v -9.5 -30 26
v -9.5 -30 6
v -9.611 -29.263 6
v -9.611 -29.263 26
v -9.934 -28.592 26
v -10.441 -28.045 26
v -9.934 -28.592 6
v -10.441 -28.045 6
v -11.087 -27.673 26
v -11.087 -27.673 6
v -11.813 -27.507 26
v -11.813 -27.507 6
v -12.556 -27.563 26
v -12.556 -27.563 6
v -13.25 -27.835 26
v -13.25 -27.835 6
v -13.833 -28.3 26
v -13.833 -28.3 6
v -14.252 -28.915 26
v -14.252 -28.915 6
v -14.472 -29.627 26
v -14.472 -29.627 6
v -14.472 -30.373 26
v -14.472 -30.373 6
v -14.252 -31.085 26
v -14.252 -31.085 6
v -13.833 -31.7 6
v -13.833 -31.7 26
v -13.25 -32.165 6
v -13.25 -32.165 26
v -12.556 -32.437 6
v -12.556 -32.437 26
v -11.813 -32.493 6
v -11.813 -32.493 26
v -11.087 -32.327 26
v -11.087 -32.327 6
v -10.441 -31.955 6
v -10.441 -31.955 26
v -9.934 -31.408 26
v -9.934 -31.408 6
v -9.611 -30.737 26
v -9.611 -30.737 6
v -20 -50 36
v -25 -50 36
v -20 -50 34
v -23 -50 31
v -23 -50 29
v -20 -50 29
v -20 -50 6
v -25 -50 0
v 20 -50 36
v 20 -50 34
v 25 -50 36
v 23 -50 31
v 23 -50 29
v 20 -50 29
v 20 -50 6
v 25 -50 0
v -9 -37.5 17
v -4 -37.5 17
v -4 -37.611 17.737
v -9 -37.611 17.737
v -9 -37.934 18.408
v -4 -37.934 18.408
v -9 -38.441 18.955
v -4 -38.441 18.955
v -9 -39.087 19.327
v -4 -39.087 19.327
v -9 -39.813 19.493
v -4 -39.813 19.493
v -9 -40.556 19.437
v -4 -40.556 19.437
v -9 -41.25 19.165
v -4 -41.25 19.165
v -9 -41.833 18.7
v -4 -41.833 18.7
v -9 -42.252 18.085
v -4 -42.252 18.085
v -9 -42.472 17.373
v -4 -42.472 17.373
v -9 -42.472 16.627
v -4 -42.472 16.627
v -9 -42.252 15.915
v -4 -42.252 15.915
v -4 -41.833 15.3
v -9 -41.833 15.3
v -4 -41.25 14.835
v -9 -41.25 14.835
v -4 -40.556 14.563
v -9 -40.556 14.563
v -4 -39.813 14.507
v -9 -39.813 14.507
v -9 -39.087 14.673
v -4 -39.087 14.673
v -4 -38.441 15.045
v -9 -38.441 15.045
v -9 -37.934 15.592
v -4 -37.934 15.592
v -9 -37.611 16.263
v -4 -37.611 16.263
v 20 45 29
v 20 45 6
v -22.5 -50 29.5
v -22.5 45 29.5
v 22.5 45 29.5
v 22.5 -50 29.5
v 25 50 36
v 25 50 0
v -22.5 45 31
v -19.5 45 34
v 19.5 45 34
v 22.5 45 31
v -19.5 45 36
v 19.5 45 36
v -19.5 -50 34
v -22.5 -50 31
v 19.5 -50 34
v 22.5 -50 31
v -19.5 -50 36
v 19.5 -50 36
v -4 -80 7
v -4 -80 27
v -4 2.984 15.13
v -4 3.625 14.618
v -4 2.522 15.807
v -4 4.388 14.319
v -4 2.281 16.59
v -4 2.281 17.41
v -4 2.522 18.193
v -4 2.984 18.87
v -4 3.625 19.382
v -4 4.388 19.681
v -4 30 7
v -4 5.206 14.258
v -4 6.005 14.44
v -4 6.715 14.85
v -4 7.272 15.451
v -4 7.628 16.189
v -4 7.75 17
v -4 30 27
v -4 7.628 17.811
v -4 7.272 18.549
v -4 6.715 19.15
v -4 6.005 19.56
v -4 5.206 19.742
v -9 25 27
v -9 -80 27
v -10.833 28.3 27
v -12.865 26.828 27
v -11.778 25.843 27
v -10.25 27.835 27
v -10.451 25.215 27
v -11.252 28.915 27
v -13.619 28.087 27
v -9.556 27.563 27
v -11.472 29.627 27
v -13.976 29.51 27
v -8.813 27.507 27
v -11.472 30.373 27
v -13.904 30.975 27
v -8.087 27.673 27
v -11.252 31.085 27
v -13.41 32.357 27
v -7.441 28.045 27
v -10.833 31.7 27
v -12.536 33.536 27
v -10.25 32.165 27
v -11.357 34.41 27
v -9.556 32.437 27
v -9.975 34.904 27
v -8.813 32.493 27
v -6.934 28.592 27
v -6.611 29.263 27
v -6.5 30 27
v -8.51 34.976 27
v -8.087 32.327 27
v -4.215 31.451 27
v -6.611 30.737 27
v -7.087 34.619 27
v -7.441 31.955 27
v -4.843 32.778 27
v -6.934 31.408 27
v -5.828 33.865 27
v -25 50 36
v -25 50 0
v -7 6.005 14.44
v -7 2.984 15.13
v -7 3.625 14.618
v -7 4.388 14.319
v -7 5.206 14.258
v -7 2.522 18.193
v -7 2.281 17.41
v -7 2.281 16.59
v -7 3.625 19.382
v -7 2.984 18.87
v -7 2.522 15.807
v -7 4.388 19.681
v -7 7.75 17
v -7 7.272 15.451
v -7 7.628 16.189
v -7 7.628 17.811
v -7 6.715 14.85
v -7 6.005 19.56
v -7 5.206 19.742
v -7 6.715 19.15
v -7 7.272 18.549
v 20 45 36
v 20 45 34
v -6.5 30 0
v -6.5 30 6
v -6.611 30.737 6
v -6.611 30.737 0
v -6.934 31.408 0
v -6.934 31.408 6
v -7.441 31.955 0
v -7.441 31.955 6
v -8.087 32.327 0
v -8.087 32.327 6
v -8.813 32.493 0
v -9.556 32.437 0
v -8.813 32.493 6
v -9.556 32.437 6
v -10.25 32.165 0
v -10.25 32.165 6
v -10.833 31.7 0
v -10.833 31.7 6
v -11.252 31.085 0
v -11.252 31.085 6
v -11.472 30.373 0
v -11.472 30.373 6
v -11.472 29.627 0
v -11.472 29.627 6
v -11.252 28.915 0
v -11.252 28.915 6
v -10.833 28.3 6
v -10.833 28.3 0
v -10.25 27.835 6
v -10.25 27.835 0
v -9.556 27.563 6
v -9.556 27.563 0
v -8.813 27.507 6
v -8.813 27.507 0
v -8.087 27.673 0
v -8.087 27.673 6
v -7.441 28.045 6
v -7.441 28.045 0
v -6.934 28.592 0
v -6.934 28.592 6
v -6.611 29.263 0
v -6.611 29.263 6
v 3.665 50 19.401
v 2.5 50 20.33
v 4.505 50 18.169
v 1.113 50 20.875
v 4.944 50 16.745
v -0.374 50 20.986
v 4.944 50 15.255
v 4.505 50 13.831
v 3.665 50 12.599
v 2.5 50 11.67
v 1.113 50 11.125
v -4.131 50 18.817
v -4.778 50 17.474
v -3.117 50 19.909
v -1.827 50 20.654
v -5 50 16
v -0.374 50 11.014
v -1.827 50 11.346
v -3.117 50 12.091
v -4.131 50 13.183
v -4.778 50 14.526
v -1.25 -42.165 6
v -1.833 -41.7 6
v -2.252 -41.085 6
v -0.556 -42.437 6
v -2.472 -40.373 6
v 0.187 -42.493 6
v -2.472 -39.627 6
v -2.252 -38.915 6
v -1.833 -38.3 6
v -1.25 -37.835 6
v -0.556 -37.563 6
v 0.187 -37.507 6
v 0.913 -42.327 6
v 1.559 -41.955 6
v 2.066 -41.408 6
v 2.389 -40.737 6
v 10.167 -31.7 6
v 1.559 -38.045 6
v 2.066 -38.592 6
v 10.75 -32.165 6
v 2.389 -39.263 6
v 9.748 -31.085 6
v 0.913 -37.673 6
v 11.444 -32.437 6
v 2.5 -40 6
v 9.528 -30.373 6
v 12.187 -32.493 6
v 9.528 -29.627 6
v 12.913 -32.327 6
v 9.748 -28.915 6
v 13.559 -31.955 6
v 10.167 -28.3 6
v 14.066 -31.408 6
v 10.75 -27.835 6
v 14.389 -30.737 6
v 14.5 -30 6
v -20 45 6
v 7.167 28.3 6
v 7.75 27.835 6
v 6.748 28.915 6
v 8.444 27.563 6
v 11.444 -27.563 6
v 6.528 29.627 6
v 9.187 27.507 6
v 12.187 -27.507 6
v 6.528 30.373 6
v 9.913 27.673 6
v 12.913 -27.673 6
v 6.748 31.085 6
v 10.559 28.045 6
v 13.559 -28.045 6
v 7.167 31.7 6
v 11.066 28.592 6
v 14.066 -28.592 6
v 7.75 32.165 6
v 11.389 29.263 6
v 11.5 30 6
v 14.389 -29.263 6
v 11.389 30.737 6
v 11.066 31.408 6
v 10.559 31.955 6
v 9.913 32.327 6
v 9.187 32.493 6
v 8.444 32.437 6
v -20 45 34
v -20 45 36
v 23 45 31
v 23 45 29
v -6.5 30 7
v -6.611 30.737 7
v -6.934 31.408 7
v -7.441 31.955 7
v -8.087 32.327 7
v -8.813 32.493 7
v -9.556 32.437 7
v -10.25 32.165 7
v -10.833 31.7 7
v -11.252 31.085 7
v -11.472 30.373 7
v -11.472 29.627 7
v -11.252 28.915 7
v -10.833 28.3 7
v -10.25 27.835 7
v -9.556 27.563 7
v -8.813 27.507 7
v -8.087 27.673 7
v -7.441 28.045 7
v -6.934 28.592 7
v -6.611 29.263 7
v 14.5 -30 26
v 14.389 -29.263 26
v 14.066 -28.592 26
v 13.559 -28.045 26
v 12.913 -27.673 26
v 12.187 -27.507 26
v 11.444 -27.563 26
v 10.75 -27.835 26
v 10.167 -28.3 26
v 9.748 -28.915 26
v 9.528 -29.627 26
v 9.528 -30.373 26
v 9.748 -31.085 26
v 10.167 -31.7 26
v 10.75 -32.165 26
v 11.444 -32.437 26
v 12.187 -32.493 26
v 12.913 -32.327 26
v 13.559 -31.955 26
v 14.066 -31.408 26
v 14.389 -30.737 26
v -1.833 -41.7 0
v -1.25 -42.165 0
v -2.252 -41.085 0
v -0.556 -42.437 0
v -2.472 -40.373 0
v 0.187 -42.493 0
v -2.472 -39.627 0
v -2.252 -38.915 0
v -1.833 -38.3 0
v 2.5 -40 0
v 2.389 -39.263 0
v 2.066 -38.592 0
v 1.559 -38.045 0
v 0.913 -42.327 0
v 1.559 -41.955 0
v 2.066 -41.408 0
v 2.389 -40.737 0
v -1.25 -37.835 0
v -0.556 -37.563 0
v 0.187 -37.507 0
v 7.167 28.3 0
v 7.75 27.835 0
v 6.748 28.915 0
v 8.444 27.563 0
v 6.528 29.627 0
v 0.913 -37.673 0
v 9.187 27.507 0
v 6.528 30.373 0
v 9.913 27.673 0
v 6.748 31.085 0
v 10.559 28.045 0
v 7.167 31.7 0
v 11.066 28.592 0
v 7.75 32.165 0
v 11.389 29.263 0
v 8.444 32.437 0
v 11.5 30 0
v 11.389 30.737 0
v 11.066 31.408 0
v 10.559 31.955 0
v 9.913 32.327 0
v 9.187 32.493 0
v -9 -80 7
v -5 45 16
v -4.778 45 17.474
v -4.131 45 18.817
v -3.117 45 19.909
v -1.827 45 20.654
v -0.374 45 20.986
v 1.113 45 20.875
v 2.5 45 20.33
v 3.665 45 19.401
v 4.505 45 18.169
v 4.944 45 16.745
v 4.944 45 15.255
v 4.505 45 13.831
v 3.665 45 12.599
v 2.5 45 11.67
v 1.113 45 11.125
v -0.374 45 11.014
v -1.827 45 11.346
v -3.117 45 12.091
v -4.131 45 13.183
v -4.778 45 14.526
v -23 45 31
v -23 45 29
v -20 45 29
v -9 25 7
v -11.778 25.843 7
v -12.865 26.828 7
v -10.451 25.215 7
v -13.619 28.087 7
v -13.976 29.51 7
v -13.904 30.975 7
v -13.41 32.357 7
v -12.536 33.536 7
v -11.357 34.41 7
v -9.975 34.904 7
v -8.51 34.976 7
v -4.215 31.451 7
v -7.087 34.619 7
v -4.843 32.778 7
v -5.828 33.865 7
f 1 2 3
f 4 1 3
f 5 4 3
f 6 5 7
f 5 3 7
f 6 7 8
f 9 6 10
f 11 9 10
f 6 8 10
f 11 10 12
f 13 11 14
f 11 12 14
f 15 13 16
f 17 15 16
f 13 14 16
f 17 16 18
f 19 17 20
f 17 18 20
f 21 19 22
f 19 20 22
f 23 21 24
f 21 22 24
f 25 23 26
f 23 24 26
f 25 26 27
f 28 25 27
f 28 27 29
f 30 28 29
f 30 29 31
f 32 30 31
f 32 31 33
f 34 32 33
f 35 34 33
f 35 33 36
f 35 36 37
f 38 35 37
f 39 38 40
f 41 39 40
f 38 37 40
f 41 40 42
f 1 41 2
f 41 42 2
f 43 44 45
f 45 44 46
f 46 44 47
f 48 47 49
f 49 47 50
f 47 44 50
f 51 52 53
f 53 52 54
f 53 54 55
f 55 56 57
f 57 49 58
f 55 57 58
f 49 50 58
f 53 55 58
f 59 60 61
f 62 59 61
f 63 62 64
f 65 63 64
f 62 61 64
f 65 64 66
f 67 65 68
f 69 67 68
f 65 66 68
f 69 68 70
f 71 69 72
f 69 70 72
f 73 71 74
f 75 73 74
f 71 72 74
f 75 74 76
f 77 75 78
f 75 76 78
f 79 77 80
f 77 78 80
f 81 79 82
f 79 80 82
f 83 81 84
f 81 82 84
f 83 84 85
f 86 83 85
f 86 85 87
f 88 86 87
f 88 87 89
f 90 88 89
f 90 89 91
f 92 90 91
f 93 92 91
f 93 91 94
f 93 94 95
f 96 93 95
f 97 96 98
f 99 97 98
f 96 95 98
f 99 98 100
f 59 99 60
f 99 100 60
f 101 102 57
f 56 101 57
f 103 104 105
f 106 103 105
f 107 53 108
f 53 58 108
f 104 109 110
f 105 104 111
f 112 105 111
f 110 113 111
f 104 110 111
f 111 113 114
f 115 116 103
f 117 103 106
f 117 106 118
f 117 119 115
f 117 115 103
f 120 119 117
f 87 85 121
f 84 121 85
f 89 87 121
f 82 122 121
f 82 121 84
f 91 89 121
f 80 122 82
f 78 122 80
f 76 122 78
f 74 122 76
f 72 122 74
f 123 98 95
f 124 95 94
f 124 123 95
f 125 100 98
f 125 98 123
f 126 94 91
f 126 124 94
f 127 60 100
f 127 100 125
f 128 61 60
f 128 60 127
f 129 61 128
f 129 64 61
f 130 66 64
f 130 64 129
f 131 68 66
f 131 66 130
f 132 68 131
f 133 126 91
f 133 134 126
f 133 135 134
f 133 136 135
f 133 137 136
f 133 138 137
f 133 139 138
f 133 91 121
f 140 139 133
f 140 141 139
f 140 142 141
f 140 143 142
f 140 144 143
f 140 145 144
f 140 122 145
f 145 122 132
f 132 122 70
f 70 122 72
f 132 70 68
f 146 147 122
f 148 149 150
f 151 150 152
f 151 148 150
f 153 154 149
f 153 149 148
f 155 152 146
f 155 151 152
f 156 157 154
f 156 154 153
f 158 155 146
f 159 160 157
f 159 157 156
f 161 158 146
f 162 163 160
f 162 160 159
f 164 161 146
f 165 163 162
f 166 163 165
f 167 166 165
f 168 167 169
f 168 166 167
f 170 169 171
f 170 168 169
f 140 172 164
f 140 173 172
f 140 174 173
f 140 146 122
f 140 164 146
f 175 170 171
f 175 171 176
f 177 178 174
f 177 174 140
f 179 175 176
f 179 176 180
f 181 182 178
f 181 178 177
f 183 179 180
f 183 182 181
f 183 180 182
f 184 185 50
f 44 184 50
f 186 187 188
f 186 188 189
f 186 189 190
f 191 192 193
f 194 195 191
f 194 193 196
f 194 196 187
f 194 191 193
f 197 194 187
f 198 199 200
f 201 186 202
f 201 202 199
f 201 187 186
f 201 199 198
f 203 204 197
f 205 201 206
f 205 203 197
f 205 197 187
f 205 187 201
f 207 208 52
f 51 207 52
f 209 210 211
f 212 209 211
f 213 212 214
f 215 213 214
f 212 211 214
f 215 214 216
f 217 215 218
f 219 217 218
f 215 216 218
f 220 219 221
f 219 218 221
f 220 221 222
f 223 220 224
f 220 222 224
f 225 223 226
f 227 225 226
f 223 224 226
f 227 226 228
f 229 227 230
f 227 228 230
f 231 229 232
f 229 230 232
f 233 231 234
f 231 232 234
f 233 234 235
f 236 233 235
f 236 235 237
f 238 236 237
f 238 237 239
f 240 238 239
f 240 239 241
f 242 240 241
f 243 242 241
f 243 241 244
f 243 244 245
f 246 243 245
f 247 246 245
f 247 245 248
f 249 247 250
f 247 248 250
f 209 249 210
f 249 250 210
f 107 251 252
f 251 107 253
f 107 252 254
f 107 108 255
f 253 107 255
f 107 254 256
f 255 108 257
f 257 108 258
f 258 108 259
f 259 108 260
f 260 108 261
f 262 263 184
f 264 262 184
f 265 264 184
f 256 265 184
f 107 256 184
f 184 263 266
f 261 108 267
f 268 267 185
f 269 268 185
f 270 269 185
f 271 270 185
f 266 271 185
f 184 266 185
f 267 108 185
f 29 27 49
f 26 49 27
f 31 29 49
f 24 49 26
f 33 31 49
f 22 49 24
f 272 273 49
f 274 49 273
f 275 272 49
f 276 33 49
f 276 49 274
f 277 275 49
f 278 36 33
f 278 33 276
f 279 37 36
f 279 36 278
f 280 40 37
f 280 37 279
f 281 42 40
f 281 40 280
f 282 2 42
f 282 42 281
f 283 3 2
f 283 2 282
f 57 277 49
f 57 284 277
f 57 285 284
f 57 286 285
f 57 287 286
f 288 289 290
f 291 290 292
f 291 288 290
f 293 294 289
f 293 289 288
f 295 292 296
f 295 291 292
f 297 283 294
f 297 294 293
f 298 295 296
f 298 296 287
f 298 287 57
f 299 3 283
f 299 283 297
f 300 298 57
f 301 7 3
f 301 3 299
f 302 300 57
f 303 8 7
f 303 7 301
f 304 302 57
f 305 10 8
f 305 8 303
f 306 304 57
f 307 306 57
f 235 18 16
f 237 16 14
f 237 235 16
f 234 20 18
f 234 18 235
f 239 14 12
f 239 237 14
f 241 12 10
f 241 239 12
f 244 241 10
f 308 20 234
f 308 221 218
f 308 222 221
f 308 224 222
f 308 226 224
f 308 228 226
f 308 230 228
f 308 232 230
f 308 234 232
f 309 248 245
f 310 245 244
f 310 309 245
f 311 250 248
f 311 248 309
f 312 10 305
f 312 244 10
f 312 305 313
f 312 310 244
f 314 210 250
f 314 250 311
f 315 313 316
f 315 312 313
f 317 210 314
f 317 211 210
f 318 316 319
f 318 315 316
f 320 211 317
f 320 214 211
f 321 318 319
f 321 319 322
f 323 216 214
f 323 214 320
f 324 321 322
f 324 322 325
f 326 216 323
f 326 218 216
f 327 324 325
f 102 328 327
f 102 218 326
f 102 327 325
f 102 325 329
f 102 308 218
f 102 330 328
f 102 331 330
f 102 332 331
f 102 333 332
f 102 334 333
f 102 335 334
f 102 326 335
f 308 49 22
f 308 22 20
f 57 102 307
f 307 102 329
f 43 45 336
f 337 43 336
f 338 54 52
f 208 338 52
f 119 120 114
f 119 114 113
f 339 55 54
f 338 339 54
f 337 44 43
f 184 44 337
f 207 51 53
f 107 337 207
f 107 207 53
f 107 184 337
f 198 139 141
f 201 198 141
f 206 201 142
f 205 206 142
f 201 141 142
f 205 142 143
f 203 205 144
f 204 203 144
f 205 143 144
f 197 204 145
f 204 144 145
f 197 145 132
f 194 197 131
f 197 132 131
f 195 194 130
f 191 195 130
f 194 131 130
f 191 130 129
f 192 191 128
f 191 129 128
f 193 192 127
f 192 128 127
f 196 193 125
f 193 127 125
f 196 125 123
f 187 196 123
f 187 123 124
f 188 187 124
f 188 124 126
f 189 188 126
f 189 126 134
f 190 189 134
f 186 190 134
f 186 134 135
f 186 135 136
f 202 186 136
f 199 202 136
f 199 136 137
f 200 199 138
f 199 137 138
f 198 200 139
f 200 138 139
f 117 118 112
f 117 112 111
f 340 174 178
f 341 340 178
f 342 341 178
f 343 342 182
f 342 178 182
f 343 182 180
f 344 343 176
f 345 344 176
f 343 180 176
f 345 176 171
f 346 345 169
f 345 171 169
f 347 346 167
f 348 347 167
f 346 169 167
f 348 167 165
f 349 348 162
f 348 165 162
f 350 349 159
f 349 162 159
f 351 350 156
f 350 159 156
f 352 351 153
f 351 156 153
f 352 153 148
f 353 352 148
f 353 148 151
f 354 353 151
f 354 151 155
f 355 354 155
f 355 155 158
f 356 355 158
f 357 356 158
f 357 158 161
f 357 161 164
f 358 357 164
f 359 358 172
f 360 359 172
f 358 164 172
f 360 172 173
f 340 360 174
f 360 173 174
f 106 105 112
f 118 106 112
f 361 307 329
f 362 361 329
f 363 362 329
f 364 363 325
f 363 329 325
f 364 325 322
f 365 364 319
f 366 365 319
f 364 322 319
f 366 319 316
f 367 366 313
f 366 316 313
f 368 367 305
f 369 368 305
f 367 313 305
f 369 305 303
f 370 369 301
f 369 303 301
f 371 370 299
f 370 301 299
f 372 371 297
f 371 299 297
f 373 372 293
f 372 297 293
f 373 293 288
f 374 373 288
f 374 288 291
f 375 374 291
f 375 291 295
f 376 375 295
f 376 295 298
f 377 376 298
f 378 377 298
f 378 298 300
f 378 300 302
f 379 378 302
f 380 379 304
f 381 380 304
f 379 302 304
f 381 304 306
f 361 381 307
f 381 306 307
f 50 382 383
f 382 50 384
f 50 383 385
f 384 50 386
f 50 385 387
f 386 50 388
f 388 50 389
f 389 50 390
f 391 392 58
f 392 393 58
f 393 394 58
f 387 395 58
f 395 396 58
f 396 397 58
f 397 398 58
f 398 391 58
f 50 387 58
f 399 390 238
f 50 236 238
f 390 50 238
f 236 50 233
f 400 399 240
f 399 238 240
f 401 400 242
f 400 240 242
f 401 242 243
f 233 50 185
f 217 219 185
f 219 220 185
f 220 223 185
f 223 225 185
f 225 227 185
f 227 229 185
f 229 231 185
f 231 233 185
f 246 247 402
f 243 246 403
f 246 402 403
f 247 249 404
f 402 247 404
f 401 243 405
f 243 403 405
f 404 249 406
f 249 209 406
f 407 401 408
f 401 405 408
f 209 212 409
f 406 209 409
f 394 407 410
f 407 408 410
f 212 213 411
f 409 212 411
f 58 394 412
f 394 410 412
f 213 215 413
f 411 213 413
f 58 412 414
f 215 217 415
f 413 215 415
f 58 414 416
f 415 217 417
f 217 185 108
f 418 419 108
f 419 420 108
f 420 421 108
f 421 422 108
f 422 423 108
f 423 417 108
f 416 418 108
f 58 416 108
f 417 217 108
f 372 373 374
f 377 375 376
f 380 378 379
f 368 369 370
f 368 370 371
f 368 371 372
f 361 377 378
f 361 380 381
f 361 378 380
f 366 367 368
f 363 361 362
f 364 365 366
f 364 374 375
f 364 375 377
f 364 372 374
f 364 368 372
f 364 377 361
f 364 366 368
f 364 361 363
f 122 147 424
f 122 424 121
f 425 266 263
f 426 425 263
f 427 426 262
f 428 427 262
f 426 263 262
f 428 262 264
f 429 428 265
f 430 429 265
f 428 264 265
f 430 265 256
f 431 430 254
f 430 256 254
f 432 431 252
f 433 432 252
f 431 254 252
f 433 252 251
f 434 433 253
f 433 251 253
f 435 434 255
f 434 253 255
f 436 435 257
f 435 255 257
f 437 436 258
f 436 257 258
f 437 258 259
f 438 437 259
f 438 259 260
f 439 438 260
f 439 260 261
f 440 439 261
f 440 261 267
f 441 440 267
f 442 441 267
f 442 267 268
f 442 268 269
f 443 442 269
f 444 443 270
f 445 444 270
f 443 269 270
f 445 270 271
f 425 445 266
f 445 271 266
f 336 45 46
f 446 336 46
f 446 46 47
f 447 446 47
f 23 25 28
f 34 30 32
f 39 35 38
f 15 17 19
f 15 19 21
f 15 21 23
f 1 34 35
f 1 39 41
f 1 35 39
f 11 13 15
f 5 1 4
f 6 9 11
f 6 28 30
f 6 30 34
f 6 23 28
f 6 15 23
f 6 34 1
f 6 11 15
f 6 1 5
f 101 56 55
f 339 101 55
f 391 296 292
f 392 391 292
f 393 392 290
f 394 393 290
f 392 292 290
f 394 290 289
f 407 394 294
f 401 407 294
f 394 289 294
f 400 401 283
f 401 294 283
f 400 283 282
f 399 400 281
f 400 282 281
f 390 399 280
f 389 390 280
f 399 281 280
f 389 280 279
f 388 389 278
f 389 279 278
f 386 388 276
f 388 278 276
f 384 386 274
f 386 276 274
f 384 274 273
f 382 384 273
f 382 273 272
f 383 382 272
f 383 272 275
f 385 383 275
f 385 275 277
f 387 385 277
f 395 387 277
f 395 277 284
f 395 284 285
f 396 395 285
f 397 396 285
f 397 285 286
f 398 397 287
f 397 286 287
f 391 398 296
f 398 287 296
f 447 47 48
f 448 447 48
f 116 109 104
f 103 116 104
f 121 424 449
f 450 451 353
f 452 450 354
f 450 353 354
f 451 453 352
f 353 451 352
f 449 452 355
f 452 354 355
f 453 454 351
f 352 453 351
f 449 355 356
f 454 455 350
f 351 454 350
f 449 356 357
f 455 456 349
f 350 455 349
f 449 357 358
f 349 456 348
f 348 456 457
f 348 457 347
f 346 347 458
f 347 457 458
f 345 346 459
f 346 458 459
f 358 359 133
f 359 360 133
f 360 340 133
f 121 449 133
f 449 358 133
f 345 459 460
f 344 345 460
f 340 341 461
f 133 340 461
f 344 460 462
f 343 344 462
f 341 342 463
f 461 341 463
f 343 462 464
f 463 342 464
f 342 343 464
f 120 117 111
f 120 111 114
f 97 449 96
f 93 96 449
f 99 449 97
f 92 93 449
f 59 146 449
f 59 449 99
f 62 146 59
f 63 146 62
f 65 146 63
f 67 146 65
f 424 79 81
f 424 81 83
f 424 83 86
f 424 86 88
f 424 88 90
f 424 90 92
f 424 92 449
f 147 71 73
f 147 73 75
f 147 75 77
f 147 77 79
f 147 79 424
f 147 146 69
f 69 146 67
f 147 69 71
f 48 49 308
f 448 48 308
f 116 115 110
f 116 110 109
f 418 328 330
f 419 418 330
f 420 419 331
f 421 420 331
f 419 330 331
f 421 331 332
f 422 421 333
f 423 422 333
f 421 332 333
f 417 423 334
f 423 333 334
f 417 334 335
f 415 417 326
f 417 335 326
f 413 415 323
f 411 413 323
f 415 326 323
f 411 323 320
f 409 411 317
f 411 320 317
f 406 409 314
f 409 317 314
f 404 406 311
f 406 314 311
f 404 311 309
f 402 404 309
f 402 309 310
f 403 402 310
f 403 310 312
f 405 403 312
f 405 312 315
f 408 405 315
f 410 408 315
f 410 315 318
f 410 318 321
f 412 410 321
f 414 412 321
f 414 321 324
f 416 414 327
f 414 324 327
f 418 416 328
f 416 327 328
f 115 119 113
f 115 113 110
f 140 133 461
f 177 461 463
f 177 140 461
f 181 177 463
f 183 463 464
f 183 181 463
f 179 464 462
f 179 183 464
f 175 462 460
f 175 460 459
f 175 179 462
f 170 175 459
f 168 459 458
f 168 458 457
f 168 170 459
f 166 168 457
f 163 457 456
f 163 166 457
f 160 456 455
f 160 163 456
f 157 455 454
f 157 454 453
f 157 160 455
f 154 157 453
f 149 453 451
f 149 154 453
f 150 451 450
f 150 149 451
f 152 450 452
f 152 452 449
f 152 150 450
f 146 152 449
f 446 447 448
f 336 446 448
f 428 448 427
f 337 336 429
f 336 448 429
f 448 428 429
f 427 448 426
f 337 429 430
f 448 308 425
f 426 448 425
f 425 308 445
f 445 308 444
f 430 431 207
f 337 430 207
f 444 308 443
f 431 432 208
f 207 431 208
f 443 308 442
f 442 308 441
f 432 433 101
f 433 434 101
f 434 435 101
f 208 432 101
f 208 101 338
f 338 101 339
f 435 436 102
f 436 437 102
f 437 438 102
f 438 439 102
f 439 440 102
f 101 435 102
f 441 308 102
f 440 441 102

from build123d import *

# Parameters (mm, degrees)
F0_W      = 50
F0_H      = 100
F1_DEPTH  = 6
F3_DEPTH  = 30
F5_DEPTH  = 95
F8_R      = 2.5
F9_DEPTH  = 6
F10_R     = 5
F11_DEPTH = 5
F12_DEPTH = 95
F14_R     = 2.5
F15_DEPTH = 20
F16_R     = 2.5
F17_DEPTH = 5
F16_R_2   = 2.75
F18_DEPTH = 3
F19_DEPTH = 20


# Not quite as in the source:
# - a feature names something its author has since deleted; it is built from what else it names


with BuildPart() as f1:
    # F0 (on Top) → F1 (new body)
    with BuildSketch(Plane.XY):
        Rectangle(F0_W, F0_H)
    extrude(amount=F1_DEPTH)

    # F2 (on face) → F3 (join)
    with BuildSketch(Plane.XY.offset(6)):
        Polygon((-20, 50), (-25, 50), (-25, 45), (-25, -50), (-20, -50), (-20, 45), (20, 45), (20, -50), (25, -50), (25, 45), (25, 50), (20, 50), align=None)
    extrude(amount=F3_DEPTH)

    # F4 (on face) → F5 (cut)
    with BuildSketch(Plane.XZ.offset(50)):
        Polygon((-23, 29), (-20, 29), (-20, 34), (-23, 31), align=None)
        Polygon((20, 34), (20, 29), (23, 29), (23, 31), align=None)
    extrude(amount=-F5_DEPTH, mode=Mode.SUBTRACT)

    # F8 (on face) → F9 (cut, through all)
    with BuildSketch(Plane.XY.offset(6)):
        with Locations((0, -40)):
            Circle(F8_R)
        with Locations((-9, 30)):
            Circle(F8_R)
        with Locations((9, 30)):
            Circle(F8_R)
    extrude(amount=-F9_DEPTH, mode=Mode.SUBTRACT)

    # F10 (on face) → F11 (cut, through all)
    with BuildSketch(Plane(origin=(0, 50, 0), x_dir=(-1, 0, 0), z_dir=(0, 1, 0))):
        with Locations((0, 16)):
            Circle(F10_R)
    extrude(amount=-F11_DEPTH, mode=Mode.SUBTRACT)

    # F8 (on face) → F19 (join)
    with BuildSketch(Plane.XY.offset(6)):
        with Locations((-12, -30)):
            Circle(F8_R)
        with Locations((12, -30)):
            Circle(F8_R)
    extrude(amount=F19_DEPTH)


with BuildPart() as f12:
    # F7 (on offset) → F12 (new body)
    with BuildSketch(Plane.XZ.offset(50)):
        Polygon((-22.5, 31), (-22.5, 29.5), (22.5, 29.5), (22.5, 31), (19.5, 34), (19.5, 36), (-19.5, 36), (-19.5, 34), align=None)
    extrude(amount=-F12_DEPTH)


with BuildPart() as f15:
    # F14 (on offset) → F15 (new body)
    with BuildSketch(Plane.XY.offset(27)):
        with BuildLine():
            Line((-4, -80), (-4, 30))
            ThreePointArc((-4, 30), (-12.5355339059, 33.5355339059), (-9, 25))
            Line((-9, 25), (-9, -80))
            Line((-9, -80), (-4, -80))
        make_face()
        with Locations((-9, 30)):
            Circle(F14_R, mode=Mode.SUBTRACT)
    extrude(amount=-F15_DEPTH)

    # F16 (on face) → F17 (cut, through all)
    with BuildSketch(Plane.YZ.offset(-4)):
        with Locations((-40, 17)):
            Circle(F16_R)
    extrude(amount=-F17_DEPTH, mode=Mode.SUBTRACT)

    # F16 (on face) → F18 (cut)
    with BuildSketch(Plane.YZ.offset(-4)):
        with Locations((5, 17)):
            Circle(F16_R_2)
    extrude(amount=-F18_DEPTH, mode=Mode.SUBTRACT)


solid = Compound([f1.part, f12.part, f15.part])
